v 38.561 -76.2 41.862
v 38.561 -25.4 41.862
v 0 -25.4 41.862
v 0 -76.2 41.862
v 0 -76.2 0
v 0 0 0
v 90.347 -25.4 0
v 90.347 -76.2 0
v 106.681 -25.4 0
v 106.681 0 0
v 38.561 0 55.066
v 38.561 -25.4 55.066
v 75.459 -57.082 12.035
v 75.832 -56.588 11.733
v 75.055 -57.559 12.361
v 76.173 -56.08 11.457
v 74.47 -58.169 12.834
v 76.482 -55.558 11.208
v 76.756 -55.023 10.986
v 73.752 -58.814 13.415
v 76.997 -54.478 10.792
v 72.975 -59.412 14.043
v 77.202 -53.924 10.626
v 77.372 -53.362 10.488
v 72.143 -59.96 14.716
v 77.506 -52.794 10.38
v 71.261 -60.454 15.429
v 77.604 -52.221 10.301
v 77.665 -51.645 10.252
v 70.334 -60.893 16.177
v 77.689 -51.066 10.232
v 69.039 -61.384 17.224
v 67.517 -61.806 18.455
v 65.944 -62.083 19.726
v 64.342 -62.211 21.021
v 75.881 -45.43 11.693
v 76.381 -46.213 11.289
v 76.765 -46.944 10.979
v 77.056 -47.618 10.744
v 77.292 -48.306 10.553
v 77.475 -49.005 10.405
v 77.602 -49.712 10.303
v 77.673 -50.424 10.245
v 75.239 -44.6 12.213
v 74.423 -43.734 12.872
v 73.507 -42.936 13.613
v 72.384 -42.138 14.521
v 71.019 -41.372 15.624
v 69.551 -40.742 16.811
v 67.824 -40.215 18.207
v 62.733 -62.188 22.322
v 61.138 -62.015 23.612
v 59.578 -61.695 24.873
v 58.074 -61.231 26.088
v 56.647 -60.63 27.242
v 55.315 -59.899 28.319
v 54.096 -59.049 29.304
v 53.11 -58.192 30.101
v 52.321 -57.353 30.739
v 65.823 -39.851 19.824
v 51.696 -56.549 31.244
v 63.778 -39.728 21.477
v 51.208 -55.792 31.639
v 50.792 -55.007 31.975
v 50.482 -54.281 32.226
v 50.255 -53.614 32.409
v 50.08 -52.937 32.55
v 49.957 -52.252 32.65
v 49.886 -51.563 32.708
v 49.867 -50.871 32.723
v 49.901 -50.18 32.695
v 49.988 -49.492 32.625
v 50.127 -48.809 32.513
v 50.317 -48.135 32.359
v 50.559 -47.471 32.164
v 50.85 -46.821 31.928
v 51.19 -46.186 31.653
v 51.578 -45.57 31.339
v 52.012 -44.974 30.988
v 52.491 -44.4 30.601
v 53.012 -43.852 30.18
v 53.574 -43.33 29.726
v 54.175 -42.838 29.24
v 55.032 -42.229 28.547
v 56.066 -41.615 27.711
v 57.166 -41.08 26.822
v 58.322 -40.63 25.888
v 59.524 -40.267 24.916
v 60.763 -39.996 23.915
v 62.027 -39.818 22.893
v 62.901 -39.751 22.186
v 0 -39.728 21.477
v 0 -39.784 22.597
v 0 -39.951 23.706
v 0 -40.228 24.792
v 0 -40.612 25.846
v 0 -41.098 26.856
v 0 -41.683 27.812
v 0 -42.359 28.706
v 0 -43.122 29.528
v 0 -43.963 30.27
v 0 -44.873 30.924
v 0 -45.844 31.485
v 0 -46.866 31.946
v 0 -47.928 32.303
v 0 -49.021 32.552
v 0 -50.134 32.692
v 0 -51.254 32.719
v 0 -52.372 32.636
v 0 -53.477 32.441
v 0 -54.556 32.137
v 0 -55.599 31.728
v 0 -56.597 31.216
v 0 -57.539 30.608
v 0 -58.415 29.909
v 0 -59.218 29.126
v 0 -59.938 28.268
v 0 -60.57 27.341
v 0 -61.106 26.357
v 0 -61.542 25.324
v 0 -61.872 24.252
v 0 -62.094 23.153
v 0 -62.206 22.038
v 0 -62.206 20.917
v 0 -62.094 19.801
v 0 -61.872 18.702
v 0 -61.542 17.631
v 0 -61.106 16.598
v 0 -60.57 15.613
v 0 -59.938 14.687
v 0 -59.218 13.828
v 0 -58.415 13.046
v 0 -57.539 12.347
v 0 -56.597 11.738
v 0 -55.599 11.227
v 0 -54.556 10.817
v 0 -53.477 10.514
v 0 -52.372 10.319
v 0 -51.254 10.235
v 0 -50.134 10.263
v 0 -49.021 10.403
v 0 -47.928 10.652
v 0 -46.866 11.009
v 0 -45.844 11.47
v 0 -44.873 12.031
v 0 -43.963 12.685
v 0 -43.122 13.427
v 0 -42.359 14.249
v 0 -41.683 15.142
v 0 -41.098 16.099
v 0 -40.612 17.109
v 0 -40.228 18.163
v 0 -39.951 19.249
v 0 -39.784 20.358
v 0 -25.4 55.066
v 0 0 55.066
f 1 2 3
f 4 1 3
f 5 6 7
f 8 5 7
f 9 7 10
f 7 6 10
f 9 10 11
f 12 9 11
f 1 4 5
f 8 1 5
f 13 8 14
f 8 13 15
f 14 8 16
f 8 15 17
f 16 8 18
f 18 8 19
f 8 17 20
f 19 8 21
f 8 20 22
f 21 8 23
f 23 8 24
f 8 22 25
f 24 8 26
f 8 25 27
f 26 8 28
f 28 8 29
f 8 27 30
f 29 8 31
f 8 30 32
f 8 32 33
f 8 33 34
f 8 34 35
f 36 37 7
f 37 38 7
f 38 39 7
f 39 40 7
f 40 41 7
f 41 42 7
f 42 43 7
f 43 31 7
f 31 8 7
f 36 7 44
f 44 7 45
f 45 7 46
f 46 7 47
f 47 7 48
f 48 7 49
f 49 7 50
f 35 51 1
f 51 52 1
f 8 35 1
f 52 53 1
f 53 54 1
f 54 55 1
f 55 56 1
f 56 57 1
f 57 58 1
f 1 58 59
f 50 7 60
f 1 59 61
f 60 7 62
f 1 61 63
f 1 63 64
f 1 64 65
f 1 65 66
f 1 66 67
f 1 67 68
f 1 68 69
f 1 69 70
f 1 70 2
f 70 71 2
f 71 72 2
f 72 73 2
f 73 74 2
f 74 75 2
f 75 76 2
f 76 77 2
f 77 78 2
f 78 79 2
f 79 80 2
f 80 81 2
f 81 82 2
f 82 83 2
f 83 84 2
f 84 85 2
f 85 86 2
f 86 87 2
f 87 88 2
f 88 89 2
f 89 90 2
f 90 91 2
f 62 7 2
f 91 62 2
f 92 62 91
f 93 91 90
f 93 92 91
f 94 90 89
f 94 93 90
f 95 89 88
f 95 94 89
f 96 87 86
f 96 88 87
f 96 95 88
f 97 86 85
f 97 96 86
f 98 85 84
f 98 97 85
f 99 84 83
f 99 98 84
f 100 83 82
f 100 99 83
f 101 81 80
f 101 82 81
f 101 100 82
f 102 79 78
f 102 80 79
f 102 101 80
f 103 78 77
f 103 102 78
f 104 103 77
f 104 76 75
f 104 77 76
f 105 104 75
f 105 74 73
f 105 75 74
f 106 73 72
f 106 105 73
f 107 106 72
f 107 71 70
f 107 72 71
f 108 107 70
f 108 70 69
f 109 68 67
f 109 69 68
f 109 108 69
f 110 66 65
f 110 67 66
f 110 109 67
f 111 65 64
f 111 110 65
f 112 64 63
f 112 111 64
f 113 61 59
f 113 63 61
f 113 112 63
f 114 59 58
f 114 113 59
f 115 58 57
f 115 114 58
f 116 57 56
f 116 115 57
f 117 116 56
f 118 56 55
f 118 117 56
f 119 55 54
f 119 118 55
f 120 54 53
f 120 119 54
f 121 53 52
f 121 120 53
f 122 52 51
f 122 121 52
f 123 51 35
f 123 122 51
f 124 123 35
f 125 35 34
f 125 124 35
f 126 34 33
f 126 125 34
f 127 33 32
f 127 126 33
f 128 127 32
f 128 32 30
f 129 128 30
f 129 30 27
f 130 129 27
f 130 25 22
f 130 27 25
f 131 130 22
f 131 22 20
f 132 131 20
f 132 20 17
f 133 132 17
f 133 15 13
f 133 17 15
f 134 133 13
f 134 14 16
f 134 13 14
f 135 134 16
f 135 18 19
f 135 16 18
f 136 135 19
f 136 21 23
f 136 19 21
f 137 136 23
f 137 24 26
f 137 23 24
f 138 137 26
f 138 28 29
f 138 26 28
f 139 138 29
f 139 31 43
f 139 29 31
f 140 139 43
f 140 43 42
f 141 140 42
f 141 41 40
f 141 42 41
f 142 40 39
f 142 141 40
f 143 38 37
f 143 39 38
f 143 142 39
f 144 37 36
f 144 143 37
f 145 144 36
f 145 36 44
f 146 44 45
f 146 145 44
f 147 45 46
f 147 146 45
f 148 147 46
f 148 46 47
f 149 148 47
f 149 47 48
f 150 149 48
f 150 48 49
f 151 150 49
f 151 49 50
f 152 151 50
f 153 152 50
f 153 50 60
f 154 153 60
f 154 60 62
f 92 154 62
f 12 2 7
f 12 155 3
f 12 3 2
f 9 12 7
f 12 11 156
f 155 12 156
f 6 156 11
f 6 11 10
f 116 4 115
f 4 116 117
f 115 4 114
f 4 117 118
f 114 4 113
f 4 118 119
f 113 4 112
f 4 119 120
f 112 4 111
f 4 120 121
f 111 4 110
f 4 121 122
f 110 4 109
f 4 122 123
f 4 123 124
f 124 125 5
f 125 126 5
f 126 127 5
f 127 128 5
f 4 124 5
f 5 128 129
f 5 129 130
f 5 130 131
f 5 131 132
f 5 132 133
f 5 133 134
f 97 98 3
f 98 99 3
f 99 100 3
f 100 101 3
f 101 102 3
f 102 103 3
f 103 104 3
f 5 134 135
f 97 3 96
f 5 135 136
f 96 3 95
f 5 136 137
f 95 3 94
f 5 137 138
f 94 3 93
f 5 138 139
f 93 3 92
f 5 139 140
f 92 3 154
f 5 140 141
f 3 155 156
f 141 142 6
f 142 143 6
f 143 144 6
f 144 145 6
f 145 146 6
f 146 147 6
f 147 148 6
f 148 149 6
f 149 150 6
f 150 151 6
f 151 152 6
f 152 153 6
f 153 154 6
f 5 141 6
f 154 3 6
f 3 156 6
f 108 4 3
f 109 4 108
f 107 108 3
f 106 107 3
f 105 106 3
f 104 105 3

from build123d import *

# Parameters (mm, degrees)
F1_DEPTH = 76.2
F2_DEPTH = 25.4
F3_R     = 11.245644
F4_DEPTH = 152.4


with BuildPart() as f1:
    # F0 (on Front) → F1 (new body)
    with BuildSketch(Plane.XZ):
        Polygon((0, 41.862), (0, 0), (90.346729, 0), (38.561046, 41.862), align=None)
    extrude(amount=F1_DEPTH)

    # F0 (on Front) → F2 (join)
    with BuildSketch(Plane.XZ):
        Polygon((0, 41.862), (0, 0), (90.346729, 0), (38.561046, 41.862), align=None)
        Polygon((0, 55.065785), (0, 41.862), (38.561046, 41.862), (90.346729, 0), (106.680565, 0), (38.561046, 55.065785), align=None)
    extrude(amount=F2_DEPTH)

    # F3 (on Right) → F4 (cut)
    with BuildSketch(Plane.YZ):
        with Locations((-50.974112, 21.47734)):
            Circle(F3_R)
    extrude(amount=F4_DEPTH, mode=Mode.SUBTRACT)


solid = f1.part
